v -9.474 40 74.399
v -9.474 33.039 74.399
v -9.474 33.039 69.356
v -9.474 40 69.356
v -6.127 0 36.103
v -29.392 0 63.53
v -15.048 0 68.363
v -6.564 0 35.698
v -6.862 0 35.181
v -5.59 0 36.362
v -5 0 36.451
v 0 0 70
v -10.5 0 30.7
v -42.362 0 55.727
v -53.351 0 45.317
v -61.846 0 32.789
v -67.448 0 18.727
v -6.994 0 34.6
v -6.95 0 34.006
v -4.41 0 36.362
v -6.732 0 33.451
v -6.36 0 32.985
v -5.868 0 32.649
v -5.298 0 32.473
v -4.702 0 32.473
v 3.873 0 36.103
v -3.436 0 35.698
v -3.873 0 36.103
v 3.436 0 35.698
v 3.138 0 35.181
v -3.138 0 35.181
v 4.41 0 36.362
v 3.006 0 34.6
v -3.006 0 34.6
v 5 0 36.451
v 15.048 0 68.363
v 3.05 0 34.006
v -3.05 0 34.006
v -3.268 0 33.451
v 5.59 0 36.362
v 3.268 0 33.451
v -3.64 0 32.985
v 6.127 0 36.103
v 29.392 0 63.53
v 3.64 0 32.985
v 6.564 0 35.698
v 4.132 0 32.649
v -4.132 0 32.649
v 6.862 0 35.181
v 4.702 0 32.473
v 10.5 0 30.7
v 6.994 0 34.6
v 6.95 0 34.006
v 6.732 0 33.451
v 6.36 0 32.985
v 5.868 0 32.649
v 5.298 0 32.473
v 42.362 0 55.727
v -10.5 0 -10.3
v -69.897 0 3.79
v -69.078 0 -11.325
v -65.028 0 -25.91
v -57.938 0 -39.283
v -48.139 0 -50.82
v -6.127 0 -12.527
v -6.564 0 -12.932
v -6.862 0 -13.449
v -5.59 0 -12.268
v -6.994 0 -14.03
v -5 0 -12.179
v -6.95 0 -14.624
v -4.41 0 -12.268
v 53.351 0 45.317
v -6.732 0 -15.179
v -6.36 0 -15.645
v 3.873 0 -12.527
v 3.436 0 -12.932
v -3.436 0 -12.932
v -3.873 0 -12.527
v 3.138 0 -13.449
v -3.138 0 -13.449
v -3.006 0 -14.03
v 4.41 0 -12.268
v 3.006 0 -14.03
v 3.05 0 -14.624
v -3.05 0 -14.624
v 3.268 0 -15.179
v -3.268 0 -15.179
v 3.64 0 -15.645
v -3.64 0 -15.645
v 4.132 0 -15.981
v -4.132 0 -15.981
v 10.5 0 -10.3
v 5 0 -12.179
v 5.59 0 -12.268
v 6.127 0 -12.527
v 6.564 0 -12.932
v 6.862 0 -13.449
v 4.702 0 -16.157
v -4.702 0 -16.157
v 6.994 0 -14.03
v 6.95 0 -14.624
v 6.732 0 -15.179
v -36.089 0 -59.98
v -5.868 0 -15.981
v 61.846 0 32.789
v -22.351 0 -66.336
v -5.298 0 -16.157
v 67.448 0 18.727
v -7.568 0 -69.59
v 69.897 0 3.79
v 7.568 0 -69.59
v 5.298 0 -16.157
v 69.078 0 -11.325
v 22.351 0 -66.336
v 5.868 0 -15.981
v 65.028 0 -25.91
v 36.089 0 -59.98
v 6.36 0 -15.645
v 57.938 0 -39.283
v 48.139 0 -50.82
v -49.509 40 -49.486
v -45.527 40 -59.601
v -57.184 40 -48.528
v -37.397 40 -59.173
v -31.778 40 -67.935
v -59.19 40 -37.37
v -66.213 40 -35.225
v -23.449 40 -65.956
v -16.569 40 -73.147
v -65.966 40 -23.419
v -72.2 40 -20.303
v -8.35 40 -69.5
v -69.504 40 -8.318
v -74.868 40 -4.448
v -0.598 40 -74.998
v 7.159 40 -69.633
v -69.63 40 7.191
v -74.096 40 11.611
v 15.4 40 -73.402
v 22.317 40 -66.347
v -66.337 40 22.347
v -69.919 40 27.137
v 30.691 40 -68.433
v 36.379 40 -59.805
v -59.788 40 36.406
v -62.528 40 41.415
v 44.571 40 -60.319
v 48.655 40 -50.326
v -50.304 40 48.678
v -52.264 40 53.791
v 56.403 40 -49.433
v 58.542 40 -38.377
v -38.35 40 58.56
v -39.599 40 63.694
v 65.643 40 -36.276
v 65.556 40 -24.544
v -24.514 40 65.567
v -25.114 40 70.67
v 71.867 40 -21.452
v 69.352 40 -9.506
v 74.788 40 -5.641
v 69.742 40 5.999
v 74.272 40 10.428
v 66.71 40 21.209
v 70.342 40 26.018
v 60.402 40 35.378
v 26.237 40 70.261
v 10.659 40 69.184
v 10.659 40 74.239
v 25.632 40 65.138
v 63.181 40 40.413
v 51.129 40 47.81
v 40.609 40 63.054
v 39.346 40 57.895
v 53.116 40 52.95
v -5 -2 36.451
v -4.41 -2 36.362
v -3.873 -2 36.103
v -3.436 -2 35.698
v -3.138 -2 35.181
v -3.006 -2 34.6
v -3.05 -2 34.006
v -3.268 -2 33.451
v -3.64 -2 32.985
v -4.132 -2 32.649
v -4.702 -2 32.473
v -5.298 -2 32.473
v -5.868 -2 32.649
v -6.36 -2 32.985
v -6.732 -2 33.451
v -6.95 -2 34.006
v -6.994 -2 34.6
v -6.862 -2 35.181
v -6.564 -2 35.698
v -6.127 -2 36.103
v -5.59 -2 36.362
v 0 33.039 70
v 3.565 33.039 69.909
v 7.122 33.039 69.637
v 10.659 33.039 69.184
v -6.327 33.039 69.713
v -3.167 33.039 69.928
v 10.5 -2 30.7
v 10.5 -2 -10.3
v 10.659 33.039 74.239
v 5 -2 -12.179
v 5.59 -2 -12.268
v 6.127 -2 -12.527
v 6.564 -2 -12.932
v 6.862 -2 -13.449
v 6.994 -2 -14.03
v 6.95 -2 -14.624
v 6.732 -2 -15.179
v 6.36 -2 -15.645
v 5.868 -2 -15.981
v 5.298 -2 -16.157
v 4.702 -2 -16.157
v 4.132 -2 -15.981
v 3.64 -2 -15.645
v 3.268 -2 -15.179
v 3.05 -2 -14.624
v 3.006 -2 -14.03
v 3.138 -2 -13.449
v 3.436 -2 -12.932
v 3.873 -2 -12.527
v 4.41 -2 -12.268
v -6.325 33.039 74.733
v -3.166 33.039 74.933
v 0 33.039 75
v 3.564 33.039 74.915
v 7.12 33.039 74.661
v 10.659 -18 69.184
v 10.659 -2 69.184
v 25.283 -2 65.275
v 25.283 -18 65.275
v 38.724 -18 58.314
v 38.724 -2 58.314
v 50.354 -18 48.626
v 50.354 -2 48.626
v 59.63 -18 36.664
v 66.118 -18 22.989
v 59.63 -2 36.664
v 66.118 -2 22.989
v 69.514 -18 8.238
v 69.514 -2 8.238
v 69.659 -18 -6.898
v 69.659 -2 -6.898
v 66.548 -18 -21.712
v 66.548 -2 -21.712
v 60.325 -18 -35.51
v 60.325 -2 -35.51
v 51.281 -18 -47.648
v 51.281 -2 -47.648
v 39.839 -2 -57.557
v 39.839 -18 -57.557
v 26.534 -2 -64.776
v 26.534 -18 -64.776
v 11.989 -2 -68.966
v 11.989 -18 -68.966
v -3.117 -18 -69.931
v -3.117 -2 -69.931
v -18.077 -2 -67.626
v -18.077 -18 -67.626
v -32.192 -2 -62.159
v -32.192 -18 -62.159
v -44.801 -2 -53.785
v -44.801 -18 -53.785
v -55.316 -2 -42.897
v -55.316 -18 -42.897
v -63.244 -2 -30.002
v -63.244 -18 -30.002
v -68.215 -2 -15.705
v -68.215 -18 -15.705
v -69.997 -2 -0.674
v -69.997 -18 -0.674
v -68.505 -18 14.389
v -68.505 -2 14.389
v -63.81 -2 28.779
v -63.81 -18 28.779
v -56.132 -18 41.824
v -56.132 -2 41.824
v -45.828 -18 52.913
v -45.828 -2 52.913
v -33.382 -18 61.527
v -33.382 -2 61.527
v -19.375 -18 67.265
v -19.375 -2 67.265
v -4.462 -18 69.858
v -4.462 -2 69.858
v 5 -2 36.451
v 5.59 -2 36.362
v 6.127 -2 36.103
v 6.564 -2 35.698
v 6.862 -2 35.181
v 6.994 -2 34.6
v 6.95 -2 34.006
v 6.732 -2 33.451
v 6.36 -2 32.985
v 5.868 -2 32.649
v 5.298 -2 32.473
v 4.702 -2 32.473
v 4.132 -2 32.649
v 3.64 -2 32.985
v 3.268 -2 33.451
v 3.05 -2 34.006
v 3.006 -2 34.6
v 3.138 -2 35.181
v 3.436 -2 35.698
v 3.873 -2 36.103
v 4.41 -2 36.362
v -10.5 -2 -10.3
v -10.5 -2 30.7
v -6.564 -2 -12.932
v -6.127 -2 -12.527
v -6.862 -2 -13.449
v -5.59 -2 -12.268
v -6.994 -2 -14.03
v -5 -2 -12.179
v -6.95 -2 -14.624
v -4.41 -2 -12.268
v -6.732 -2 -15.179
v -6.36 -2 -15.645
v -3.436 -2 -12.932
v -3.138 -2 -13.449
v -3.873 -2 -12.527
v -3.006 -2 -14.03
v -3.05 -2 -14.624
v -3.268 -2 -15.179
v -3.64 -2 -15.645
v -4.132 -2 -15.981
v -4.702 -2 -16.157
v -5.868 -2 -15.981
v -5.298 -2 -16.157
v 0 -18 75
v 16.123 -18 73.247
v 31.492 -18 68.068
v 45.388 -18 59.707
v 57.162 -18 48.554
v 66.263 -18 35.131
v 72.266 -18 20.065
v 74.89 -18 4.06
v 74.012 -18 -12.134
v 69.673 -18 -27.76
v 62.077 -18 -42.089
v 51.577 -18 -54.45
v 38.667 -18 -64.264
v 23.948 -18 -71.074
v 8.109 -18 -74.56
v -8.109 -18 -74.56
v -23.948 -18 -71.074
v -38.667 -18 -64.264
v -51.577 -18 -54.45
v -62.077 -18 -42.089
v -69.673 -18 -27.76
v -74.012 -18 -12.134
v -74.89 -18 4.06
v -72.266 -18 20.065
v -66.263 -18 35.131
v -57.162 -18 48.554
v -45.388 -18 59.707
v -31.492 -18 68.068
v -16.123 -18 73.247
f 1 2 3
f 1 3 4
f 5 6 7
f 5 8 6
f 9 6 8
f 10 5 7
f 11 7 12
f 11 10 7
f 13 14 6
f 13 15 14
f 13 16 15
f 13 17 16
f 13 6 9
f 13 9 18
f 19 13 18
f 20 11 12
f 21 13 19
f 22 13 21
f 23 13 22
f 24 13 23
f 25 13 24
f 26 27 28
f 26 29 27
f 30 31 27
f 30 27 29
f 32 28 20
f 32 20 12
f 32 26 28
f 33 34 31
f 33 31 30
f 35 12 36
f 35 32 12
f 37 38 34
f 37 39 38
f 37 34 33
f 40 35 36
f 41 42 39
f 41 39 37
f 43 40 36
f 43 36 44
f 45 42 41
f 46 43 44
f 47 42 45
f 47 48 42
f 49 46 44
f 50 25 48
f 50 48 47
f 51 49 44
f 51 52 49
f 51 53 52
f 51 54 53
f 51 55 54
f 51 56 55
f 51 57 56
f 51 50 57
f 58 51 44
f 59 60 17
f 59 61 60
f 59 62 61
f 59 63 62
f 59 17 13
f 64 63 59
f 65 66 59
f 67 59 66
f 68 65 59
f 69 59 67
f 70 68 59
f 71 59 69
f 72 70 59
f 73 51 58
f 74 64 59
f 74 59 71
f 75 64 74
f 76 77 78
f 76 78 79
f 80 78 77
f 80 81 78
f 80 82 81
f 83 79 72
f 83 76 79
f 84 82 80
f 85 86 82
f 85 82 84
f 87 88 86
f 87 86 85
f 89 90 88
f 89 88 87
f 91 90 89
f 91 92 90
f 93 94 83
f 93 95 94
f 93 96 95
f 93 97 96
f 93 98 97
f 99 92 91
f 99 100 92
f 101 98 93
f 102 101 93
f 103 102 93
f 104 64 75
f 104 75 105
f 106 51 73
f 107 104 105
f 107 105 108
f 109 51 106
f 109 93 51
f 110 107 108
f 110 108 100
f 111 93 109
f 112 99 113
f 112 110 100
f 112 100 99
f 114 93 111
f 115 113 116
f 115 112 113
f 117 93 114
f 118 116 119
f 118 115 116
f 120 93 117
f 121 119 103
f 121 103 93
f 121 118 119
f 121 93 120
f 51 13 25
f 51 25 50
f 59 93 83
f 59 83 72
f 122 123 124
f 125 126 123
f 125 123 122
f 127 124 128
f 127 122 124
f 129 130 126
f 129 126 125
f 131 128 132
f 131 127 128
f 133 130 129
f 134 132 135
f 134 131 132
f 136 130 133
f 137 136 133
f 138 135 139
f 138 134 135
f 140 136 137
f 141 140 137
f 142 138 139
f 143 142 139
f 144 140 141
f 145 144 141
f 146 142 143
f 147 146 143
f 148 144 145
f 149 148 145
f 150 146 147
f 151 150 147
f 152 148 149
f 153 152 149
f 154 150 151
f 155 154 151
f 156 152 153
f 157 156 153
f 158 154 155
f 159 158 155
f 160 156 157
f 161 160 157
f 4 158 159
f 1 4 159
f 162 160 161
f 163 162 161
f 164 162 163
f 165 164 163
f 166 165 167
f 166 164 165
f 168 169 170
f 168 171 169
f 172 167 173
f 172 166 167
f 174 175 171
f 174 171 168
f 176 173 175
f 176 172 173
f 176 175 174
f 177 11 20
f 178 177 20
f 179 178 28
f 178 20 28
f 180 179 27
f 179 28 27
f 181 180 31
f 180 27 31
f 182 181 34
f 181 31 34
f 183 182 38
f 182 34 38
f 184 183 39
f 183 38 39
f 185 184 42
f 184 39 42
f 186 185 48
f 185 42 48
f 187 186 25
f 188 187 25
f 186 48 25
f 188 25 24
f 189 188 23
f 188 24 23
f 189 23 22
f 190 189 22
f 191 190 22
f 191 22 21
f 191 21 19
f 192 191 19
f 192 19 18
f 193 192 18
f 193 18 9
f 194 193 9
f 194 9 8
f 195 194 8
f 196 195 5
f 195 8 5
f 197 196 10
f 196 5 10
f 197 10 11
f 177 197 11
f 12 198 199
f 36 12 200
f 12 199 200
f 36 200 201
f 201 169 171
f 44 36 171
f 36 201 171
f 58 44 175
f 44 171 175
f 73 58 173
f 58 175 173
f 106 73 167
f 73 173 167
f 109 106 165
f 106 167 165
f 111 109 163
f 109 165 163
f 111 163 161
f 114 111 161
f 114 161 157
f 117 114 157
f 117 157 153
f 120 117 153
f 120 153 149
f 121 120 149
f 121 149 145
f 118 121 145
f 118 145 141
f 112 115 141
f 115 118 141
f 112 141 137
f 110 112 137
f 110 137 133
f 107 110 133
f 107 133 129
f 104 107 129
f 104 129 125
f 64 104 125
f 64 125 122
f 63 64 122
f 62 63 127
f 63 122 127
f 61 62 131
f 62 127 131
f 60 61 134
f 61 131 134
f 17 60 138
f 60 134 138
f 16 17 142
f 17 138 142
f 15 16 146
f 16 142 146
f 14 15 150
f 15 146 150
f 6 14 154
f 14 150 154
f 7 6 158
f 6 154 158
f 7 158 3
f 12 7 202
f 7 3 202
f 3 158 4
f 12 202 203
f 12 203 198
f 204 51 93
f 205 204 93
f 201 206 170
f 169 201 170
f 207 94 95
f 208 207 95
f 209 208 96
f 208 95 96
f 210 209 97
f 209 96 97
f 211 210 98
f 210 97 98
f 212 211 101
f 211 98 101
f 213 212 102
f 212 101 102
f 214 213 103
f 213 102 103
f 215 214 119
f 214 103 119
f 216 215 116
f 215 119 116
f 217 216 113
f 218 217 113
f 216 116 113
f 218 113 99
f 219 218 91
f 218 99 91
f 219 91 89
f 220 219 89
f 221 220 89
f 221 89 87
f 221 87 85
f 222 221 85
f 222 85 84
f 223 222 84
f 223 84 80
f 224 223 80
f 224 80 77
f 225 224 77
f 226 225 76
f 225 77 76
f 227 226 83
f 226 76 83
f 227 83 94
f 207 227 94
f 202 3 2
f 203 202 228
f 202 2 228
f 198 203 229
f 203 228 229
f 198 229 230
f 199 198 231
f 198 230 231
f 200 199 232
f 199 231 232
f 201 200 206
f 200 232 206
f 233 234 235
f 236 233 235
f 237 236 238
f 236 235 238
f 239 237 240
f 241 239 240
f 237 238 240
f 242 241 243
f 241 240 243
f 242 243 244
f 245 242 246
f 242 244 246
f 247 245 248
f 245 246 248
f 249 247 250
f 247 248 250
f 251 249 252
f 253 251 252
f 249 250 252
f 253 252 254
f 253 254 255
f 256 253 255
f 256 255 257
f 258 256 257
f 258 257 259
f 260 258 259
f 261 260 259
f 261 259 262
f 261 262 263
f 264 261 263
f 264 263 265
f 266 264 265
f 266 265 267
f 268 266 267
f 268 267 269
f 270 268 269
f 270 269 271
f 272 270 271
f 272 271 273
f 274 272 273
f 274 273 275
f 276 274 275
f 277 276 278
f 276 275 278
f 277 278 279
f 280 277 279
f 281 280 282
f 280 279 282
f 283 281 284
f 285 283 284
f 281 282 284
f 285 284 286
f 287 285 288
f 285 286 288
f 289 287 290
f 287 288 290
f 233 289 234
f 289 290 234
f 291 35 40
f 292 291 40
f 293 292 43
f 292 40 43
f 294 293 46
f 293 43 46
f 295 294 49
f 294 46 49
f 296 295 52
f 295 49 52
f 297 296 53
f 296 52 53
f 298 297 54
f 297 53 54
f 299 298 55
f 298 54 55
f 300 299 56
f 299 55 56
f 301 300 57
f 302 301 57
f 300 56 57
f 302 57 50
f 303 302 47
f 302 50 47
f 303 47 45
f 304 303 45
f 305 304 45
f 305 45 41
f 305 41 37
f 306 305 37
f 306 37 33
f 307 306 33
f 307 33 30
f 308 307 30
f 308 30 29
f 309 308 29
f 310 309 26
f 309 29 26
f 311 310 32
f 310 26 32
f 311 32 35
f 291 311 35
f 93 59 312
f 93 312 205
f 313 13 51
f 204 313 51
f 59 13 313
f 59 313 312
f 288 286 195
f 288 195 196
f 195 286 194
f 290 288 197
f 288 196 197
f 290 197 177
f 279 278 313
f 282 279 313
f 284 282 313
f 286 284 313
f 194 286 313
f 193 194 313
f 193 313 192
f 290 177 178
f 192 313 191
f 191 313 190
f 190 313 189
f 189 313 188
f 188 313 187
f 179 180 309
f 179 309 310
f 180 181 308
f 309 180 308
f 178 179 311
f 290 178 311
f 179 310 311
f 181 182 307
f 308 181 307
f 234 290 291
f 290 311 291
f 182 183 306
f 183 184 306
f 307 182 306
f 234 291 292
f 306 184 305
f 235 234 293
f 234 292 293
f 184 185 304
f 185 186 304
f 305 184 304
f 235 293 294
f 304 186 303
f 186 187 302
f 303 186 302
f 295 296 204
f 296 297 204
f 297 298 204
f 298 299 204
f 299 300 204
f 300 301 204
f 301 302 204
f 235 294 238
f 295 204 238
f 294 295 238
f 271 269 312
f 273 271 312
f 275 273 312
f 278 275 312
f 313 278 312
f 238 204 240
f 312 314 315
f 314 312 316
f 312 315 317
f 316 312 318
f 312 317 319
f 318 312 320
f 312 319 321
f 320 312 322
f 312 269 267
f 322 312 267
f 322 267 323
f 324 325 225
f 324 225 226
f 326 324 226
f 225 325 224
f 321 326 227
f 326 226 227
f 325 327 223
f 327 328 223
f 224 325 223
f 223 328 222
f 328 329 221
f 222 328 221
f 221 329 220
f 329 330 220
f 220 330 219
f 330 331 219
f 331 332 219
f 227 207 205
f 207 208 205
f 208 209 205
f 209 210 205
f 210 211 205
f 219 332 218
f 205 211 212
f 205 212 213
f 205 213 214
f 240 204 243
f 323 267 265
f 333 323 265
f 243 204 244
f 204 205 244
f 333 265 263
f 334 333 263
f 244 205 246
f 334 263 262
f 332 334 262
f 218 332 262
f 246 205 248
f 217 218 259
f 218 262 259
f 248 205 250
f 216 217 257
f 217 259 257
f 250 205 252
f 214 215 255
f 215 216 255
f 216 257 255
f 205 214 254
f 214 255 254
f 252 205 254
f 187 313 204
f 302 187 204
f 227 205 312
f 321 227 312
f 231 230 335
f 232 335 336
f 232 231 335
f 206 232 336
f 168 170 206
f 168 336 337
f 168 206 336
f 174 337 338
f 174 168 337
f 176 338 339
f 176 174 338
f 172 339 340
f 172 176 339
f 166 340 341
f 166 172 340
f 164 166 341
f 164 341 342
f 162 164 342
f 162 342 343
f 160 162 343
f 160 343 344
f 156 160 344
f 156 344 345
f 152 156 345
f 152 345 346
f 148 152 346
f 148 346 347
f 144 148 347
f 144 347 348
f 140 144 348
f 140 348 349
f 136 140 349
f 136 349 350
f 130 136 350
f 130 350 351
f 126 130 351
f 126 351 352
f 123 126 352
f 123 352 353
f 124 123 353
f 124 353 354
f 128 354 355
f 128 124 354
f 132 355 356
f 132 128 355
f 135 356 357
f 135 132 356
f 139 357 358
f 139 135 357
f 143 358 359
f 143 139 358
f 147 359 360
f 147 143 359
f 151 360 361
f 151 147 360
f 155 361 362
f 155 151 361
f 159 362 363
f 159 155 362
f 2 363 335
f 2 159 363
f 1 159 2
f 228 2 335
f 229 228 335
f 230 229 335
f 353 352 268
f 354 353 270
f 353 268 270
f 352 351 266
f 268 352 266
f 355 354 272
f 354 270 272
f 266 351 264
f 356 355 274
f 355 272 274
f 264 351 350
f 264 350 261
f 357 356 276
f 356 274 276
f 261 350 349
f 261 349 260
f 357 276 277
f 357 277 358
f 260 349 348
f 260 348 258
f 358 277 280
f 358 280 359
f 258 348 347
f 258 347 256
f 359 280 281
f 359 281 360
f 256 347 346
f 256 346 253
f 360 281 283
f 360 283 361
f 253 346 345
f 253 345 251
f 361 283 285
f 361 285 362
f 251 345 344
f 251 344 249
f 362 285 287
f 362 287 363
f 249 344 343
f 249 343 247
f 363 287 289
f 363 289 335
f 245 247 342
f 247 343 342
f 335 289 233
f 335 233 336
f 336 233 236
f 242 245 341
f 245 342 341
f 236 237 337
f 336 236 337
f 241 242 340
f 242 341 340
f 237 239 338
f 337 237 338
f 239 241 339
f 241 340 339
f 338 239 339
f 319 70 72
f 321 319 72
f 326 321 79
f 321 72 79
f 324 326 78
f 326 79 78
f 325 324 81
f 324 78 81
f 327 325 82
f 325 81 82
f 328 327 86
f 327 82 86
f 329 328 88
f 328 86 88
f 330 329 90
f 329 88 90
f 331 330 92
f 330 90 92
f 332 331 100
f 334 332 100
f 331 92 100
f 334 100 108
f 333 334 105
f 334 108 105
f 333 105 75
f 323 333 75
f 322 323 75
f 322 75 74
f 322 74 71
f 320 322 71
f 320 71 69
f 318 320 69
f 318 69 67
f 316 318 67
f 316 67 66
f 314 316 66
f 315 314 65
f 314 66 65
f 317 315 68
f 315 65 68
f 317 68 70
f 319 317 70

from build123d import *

# Parameters (mm, degrees)
ESQUISSE1_R             = 75
ESQUISSE1_R_2           = 2
ESQUISSE1_W             = 21
ESQUISSE1_H             = 41
BOSS_EXTRU_1_DEPTH      = 2
BOSS_EXTRU_2_START      = 40
ESQUISSE1_4_R           = 75
ESQUISSE1_4_R_2         = 70
BOSS_EXTRU_2_DEPTH      = 40
ESQUISSE2_W             = 20.133446777
ESQUISSE2_H             = 7.336961674
ENL_V_MAT_EXTRU_1_DEPTH = 40
ESQUISSE1_5_R           = 75
ESQUISSE1_5_R_2         = 70
BOSS_EXTRU_3_DEPTH      = 18


with BuildPart() as part:
    # Esquisse1 → Boss.-Extru.1 (new body)
    with BuildSketch(Plane(origin=(0, 0, 0), x_dir=(1, 0, 0), z_dir=(0, 1, 0))):
        Circle(ESQUISSE1_R)
        with Locations((5, 14.17927264)):
            Circle(ESQUISSE1_R_2, mode=Mode.SUBTRACT)
        with Locations((-5, -34.45072736)):
            Circle(ESQUISSE1_R_2, mode=Mode.SUBTRACT)
        with Locations((5, -34.45072736)):
            Circle(ESQUISSE1_R_2, mode=Mode.SUBTRACT)
        with Locations((0, -10.2)):
            Rectangle(ESQUISSE1_W, ESQUISSE1_H, mode=Mode.SUBTRACT)
        with Locations((-5, 14.17927264)):
            Circle(ESQUISSE1_R_2, mode=Mode.SUBTRACT)
    extrude(amount=-BOSS_EXTRU_1_DEPTH)

    # Esquisse1<4> → Boss.-Extru.2 (add)
    with BuildSketch(Plane(origin=(0, 0, 0), x_dir=(1, 0, 0), z_dir=(0, 1, 0)).offset(BOSS_EXTRU_2_START)):
        Circle(ESQUISSE1_4_R)
        Circle(ESQUISSE1_4_R_2, mode=Mode.SUBTRACT)
    extrude(amount=-BOSS_EXTRU_2_DEPTH)

    # Esquisse2 → Enlèv. mat.-Extru.1 (cut)
    with BuildSketch(Plane.XY.offset(75)):
        with Locations((0.592594447, 36.707948234)):
            Rectangle(ESQUISSE2_W, ESQUISSE2_H)
    extrude(amount=-ENL_V_MAT_EXTRU_1_DEPTH, mode=Mode.SUBTRACT)

    # Esquisse1<5> → Boss.-Extru.3 (add)
    with BuildSketch(Plane(origin=(0, 0, 0), x_dir=(1, 0, 0), z_dir=(0, 1, 0))):
        Circle(ESQUISSE1_5_R)
        Circle(ESQUISSE1_5_R_2, mode=Mode.SUBTRACT)
    extrude(amount=-BOSS_EXTRU_3_DEPTH)


solid = part.part
